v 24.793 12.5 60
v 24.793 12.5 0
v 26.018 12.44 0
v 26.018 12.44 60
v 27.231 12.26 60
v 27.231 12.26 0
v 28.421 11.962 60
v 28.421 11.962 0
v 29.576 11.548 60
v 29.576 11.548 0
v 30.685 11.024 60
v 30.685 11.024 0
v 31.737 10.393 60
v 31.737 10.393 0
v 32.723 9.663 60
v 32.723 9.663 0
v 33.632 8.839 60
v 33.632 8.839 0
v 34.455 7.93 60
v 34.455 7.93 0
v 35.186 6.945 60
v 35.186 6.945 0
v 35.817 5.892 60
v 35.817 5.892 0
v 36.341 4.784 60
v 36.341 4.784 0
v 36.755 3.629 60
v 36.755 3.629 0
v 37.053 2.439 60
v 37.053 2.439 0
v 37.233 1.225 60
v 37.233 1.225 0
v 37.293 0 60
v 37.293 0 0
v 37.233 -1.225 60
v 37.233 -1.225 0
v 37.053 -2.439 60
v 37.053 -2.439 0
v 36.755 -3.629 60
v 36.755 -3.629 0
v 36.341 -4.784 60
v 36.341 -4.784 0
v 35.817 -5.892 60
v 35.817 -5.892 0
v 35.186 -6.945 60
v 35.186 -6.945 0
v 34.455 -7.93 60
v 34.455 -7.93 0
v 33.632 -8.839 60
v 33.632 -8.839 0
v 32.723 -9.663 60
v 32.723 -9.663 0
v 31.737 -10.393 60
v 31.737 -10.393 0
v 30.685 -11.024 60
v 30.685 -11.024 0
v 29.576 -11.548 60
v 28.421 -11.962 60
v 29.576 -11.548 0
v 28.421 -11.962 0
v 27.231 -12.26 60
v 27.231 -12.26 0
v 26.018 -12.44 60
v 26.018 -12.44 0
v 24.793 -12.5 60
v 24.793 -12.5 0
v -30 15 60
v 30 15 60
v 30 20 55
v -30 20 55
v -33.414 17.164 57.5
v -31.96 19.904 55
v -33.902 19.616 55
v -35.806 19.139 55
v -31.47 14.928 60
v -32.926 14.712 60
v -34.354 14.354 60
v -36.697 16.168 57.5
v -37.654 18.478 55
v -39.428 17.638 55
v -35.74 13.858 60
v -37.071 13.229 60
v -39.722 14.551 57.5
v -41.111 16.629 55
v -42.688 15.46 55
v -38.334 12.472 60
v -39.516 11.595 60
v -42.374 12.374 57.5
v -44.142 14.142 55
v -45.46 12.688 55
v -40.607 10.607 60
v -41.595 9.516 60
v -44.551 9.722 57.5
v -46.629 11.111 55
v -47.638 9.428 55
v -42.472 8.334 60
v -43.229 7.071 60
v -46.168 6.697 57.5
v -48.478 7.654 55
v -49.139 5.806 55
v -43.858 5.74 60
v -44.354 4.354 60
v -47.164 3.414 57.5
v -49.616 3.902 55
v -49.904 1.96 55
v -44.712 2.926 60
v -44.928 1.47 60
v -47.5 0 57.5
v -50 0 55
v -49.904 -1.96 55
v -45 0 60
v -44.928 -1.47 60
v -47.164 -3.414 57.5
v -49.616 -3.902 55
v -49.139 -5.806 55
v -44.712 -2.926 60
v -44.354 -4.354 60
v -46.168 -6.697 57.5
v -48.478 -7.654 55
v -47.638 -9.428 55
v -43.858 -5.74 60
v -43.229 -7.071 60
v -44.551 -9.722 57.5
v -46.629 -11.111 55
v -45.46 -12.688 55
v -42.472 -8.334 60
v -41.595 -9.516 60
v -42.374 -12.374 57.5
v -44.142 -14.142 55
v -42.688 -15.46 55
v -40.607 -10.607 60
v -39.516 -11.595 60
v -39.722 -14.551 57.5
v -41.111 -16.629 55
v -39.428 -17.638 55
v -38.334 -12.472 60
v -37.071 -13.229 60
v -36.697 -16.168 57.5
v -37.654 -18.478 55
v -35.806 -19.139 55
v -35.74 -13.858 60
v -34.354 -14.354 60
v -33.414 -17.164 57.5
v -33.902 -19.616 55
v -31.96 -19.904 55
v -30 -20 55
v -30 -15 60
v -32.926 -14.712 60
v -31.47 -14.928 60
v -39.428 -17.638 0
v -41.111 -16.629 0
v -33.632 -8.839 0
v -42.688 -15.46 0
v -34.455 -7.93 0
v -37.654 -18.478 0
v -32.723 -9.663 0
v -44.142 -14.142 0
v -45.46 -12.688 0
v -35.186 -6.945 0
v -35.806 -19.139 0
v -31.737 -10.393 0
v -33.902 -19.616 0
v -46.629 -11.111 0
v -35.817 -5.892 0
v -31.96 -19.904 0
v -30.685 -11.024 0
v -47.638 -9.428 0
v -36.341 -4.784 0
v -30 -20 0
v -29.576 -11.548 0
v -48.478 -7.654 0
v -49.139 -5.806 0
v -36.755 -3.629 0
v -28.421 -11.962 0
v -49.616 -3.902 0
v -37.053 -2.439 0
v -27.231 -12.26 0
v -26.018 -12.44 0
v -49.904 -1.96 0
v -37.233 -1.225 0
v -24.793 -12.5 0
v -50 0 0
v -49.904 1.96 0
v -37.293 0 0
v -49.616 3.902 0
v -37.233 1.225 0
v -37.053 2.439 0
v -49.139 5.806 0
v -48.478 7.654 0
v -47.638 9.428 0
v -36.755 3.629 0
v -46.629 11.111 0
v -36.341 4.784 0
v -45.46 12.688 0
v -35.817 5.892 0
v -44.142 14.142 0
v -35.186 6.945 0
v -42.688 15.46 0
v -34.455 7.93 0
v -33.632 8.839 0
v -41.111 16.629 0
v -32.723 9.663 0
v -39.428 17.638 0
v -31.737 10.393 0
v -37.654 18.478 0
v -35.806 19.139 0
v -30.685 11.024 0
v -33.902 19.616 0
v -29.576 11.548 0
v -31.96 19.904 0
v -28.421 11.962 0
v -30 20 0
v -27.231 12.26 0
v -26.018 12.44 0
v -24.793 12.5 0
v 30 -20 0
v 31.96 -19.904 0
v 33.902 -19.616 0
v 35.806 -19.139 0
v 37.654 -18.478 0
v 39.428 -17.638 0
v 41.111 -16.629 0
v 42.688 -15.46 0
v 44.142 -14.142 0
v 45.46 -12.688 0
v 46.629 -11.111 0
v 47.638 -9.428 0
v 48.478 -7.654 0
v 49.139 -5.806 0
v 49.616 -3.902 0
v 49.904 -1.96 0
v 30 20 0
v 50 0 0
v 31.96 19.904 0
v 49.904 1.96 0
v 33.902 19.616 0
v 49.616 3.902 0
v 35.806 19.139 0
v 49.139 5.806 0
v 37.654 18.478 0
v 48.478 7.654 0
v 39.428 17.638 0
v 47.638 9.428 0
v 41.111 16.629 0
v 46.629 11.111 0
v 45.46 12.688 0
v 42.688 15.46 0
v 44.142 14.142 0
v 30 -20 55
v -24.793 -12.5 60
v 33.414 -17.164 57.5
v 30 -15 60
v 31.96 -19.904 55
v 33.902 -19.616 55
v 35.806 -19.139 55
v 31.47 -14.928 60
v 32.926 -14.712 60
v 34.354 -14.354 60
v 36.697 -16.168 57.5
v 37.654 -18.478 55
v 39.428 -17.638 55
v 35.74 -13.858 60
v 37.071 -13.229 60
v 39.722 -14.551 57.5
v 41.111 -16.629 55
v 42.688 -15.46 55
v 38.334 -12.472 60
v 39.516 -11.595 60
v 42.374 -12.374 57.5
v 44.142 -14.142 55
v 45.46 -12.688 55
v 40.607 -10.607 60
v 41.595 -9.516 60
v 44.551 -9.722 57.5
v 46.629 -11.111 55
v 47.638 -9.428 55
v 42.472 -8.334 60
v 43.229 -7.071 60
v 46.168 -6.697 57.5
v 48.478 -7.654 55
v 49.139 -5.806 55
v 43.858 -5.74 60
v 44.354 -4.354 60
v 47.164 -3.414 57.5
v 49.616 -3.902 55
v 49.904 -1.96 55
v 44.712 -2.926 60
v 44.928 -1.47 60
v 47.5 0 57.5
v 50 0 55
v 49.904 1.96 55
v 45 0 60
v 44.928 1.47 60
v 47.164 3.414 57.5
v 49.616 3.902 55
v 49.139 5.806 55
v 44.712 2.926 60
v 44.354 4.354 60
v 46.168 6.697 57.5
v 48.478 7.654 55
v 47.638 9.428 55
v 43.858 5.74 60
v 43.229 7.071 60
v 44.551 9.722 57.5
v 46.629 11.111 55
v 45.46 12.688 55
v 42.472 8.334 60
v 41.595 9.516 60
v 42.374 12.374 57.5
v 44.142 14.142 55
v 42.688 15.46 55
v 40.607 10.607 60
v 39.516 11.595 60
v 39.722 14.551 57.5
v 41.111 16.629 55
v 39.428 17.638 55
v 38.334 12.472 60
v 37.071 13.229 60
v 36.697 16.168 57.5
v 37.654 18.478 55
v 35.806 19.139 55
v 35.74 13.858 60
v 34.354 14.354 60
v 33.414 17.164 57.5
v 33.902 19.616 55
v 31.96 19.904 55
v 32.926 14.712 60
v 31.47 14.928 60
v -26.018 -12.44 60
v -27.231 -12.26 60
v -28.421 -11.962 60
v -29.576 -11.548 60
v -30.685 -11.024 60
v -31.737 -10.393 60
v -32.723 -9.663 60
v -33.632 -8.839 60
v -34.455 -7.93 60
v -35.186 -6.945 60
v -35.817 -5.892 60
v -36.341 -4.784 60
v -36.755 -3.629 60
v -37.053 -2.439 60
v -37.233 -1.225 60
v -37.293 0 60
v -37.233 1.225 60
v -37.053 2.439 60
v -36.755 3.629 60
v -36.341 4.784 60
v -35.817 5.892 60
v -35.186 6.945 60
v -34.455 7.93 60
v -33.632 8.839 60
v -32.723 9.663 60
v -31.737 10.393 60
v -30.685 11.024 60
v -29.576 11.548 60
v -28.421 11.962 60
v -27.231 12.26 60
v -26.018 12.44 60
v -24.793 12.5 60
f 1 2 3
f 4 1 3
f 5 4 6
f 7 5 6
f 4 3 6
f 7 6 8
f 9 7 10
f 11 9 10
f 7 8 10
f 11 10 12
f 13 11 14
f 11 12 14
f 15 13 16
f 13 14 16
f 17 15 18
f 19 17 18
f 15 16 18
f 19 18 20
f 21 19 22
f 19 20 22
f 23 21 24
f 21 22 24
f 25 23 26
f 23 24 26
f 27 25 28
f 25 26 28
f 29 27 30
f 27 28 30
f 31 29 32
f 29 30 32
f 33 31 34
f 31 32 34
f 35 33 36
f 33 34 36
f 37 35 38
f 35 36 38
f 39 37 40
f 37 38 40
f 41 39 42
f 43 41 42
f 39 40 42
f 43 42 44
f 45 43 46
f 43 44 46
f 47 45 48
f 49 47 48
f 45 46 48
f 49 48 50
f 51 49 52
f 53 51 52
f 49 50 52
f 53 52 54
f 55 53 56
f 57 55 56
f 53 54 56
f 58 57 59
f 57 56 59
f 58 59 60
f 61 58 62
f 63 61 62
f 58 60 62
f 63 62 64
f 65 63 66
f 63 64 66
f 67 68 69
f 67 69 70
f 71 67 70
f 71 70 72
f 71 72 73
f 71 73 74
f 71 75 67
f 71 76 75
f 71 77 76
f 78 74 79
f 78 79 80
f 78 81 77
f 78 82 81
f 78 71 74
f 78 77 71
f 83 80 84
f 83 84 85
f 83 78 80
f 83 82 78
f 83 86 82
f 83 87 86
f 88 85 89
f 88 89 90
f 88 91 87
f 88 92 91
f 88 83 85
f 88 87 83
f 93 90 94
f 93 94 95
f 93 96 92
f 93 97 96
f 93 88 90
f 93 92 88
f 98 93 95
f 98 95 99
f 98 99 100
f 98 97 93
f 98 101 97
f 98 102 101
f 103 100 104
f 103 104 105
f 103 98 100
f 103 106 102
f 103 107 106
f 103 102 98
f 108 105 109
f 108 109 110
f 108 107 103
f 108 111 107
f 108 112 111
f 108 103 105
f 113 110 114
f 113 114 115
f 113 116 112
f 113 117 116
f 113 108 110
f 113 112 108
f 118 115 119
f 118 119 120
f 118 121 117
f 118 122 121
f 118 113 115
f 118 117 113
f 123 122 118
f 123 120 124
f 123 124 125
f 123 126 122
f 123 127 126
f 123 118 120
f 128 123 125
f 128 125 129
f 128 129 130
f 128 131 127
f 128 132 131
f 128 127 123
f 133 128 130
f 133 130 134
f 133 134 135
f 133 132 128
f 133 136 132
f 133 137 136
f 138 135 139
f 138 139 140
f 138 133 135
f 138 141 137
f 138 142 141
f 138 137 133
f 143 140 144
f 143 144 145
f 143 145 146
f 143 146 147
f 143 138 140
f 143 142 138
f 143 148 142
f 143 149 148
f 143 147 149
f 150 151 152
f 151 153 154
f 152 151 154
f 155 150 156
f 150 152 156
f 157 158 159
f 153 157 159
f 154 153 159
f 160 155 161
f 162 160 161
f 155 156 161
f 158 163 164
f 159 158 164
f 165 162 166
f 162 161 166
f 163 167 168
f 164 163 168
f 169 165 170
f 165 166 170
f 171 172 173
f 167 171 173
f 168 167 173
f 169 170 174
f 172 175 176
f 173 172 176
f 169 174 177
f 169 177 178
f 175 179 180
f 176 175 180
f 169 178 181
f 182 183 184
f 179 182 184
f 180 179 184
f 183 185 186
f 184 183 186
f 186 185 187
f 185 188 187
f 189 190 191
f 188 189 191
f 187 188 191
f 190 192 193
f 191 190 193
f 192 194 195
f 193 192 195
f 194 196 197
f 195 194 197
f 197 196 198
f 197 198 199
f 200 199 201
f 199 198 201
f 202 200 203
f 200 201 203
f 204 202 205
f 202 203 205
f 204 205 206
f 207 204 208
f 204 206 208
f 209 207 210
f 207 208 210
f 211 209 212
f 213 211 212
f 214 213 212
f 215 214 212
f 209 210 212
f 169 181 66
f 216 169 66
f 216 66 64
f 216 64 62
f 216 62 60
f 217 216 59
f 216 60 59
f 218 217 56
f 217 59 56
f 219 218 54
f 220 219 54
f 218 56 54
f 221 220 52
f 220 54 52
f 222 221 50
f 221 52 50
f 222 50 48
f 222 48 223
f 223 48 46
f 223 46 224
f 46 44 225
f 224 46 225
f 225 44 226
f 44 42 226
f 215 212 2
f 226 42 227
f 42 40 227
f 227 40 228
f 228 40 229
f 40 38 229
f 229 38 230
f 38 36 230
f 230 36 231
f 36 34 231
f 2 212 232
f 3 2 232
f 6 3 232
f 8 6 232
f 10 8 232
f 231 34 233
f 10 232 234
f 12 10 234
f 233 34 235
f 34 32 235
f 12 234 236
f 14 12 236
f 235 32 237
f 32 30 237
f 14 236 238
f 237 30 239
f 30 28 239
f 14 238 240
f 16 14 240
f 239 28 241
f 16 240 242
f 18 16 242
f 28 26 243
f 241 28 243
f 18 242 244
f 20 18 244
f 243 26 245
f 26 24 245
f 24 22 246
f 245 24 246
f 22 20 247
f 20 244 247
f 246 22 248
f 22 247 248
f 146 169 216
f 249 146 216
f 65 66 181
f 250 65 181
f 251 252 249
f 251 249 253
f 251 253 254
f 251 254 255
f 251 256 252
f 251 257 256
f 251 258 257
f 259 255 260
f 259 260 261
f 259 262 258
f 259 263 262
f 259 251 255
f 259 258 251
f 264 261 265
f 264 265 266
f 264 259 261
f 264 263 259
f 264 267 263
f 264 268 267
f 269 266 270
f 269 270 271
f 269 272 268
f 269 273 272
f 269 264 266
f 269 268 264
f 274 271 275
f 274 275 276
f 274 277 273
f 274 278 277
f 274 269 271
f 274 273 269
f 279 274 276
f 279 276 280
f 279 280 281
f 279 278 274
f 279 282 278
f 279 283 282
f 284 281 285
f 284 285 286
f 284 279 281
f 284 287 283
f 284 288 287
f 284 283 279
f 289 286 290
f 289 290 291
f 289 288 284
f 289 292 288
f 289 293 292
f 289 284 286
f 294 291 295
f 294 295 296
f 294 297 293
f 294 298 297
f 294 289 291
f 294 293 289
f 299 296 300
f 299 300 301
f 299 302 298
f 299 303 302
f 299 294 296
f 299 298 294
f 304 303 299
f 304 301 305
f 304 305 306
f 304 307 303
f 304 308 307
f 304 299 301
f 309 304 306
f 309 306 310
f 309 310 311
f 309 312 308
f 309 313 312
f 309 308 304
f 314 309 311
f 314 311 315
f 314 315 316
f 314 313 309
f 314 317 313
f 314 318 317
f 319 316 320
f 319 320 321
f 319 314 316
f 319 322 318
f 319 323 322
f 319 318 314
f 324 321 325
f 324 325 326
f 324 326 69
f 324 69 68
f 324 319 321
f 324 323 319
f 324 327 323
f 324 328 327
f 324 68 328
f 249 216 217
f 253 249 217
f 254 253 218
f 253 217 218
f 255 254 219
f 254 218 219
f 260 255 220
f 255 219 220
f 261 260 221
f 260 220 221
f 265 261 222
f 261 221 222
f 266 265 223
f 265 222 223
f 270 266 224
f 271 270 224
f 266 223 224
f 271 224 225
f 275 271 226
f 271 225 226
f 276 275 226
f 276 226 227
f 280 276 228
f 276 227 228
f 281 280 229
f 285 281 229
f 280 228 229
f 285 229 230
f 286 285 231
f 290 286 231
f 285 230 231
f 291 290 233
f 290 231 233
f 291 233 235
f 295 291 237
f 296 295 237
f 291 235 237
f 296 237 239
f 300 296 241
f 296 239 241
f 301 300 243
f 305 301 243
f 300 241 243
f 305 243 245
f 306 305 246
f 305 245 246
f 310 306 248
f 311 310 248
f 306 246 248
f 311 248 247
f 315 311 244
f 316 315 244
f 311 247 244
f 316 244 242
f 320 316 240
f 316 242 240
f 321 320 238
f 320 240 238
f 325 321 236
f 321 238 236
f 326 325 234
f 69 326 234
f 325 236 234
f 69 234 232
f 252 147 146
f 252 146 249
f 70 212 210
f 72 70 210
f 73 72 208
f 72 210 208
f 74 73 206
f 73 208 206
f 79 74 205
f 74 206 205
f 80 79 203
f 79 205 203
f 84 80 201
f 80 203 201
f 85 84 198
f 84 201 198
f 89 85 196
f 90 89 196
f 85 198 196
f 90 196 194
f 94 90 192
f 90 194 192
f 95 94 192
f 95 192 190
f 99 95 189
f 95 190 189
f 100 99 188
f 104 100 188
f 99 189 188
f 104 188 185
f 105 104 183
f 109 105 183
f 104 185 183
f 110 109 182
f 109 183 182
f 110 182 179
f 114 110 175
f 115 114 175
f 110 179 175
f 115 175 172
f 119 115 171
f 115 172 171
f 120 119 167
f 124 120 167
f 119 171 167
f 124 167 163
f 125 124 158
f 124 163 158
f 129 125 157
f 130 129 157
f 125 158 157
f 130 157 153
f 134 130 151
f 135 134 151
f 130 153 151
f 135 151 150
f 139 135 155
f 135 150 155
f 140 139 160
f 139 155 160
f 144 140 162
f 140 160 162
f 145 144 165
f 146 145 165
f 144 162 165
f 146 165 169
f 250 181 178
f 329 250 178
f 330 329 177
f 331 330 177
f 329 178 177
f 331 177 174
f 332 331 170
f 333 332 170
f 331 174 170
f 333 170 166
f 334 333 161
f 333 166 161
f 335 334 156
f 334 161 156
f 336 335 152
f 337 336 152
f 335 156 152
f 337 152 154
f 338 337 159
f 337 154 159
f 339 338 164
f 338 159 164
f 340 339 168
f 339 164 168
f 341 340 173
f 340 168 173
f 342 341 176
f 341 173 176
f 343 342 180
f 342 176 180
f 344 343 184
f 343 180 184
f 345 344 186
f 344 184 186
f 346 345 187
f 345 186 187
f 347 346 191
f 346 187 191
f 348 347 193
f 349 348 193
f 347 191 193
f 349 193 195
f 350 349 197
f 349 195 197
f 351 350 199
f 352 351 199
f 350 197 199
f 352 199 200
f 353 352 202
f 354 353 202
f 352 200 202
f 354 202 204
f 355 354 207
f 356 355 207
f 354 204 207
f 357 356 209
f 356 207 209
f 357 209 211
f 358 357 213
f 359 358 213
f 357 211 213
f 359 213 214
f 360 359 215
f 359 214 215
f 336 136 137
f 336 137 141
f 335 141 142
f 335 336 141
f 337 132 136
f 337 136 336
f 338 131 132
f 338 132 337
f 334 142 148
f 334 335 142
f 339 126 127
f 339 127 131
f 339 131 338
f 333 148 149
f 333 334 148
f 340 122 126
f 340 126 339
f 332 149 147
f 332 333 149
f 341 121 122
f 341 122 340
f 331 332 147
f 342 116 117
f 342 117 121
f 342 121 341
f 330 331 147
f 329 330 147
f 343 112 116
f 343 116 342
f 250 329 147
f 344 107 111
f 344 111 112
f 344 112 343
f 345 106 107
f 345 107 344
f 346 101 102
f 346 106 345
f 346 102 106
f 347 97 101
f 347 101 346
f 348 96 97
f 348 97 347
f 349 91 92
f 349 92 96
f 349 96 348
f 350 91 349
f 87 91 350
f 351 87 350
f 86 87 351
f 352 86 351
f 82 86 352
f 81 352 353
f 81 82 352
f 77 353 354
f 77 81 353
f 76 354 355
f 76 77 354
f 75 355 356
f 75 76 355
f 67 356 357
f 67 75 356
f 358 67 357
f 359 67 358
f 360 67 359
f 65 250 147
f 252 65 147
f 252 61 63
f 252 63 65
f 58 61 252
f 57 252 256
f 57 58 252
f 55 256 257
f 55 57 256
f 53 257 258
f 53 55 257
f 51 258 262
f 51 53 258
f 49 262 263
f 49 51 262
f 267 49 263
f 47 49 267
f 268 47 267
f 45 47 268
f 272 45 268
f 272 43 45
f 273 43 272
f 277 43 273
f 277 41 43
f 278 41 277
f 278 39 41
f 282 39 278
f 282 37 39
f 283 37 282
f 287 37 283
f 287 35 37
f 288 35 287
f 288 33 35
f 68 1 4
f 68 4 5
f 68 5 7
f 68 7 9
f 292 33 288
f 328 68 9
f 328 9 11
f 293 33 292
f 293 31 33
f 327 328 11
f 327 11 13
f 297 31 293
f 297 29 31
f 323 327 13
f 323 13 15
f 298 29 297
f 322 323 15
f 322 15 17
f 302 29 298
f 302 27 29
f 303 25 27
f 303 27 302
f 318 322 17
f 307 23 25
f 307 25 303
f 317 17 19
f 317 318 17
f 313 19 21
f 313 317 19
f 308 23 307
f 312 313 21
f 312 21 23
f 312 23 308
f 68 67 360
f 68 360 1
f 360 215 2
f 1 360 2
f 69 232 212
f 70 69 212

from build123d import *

# Parameters (mm, degrees)
F1_DEPTH = 60
F2_SIZE2 = 5
F2_SIZE  = 5


with BuildPart() as f1:
    # F0 (on Top) → F1 (new body)
    with BuildSketch(Plane.XY):
        with BuildLine():
            Line((30, 20), (0, 20))
            Line((0, 20), (-30, 20))
            ThreePointArc((-30, 20), (-50, 0), (-30, -20))
            Line((-30, -20), (0, -20))
            Line((0, -20), (30, -20))
            ThreePointArc((30, -20), (50, 0), (30, 20))
        make_face()
        with BuildLine():
            Line((-30, 15), (0, 15))
            Line((0, 15), (30, 15))
            ThreePointArc((30, 15), (45, 0), (30, -15))
            Line((30, -15), (0, -15))
            Line((0, -15), (-30, -15))
            ThreePointArc((-30, -15), (-45, 0), (-30, 15))
        make_face(mode=Mode.SUBTRACT)
        with BuildLine():
            Line((30, 15), (0, 15))
            Line((0, 15), (-30, 15))
            ThreePointArc((-30, 15), (-45, 0), (-30, -15))
            Line((-30, -15), (0, -15))
            Line((0, -15), (30, -15))
            ThreePointArc((30, -15), (45, 0), (30, 15))
        make_face()
        with BuildLine():
            Line((24.7928556055, -12.5), (0, -12.5))
            Line((0, -12.5), (-24.7928556055, -12.5))
            ThreePointArc((-24.7928556055, -12.5), (-37.2928556055, 0), (-24.7928556055, 12.5))
            Line((-24.7928556055, 12.5), (0, 12.5))
            Line((0, 12.5), (24.7928556055, 12.5))
            ThreePointArc((24.7928556055, 12.5), (37.2928556055, 0), (24.7928556055, -12.5))
        make_face(mode=Mode.SUBTRACT)
    extrude(amount=F1_DEPTH)

    # F2
    f2_edges = [f1.edges().sort_by_distance(p)[0] for p in [
        (-50, 0, 60),
    ]]
    chamfer(f2_edges, length=F2_SIZE, length2=F2_SIZE2)


solid = f1.part
